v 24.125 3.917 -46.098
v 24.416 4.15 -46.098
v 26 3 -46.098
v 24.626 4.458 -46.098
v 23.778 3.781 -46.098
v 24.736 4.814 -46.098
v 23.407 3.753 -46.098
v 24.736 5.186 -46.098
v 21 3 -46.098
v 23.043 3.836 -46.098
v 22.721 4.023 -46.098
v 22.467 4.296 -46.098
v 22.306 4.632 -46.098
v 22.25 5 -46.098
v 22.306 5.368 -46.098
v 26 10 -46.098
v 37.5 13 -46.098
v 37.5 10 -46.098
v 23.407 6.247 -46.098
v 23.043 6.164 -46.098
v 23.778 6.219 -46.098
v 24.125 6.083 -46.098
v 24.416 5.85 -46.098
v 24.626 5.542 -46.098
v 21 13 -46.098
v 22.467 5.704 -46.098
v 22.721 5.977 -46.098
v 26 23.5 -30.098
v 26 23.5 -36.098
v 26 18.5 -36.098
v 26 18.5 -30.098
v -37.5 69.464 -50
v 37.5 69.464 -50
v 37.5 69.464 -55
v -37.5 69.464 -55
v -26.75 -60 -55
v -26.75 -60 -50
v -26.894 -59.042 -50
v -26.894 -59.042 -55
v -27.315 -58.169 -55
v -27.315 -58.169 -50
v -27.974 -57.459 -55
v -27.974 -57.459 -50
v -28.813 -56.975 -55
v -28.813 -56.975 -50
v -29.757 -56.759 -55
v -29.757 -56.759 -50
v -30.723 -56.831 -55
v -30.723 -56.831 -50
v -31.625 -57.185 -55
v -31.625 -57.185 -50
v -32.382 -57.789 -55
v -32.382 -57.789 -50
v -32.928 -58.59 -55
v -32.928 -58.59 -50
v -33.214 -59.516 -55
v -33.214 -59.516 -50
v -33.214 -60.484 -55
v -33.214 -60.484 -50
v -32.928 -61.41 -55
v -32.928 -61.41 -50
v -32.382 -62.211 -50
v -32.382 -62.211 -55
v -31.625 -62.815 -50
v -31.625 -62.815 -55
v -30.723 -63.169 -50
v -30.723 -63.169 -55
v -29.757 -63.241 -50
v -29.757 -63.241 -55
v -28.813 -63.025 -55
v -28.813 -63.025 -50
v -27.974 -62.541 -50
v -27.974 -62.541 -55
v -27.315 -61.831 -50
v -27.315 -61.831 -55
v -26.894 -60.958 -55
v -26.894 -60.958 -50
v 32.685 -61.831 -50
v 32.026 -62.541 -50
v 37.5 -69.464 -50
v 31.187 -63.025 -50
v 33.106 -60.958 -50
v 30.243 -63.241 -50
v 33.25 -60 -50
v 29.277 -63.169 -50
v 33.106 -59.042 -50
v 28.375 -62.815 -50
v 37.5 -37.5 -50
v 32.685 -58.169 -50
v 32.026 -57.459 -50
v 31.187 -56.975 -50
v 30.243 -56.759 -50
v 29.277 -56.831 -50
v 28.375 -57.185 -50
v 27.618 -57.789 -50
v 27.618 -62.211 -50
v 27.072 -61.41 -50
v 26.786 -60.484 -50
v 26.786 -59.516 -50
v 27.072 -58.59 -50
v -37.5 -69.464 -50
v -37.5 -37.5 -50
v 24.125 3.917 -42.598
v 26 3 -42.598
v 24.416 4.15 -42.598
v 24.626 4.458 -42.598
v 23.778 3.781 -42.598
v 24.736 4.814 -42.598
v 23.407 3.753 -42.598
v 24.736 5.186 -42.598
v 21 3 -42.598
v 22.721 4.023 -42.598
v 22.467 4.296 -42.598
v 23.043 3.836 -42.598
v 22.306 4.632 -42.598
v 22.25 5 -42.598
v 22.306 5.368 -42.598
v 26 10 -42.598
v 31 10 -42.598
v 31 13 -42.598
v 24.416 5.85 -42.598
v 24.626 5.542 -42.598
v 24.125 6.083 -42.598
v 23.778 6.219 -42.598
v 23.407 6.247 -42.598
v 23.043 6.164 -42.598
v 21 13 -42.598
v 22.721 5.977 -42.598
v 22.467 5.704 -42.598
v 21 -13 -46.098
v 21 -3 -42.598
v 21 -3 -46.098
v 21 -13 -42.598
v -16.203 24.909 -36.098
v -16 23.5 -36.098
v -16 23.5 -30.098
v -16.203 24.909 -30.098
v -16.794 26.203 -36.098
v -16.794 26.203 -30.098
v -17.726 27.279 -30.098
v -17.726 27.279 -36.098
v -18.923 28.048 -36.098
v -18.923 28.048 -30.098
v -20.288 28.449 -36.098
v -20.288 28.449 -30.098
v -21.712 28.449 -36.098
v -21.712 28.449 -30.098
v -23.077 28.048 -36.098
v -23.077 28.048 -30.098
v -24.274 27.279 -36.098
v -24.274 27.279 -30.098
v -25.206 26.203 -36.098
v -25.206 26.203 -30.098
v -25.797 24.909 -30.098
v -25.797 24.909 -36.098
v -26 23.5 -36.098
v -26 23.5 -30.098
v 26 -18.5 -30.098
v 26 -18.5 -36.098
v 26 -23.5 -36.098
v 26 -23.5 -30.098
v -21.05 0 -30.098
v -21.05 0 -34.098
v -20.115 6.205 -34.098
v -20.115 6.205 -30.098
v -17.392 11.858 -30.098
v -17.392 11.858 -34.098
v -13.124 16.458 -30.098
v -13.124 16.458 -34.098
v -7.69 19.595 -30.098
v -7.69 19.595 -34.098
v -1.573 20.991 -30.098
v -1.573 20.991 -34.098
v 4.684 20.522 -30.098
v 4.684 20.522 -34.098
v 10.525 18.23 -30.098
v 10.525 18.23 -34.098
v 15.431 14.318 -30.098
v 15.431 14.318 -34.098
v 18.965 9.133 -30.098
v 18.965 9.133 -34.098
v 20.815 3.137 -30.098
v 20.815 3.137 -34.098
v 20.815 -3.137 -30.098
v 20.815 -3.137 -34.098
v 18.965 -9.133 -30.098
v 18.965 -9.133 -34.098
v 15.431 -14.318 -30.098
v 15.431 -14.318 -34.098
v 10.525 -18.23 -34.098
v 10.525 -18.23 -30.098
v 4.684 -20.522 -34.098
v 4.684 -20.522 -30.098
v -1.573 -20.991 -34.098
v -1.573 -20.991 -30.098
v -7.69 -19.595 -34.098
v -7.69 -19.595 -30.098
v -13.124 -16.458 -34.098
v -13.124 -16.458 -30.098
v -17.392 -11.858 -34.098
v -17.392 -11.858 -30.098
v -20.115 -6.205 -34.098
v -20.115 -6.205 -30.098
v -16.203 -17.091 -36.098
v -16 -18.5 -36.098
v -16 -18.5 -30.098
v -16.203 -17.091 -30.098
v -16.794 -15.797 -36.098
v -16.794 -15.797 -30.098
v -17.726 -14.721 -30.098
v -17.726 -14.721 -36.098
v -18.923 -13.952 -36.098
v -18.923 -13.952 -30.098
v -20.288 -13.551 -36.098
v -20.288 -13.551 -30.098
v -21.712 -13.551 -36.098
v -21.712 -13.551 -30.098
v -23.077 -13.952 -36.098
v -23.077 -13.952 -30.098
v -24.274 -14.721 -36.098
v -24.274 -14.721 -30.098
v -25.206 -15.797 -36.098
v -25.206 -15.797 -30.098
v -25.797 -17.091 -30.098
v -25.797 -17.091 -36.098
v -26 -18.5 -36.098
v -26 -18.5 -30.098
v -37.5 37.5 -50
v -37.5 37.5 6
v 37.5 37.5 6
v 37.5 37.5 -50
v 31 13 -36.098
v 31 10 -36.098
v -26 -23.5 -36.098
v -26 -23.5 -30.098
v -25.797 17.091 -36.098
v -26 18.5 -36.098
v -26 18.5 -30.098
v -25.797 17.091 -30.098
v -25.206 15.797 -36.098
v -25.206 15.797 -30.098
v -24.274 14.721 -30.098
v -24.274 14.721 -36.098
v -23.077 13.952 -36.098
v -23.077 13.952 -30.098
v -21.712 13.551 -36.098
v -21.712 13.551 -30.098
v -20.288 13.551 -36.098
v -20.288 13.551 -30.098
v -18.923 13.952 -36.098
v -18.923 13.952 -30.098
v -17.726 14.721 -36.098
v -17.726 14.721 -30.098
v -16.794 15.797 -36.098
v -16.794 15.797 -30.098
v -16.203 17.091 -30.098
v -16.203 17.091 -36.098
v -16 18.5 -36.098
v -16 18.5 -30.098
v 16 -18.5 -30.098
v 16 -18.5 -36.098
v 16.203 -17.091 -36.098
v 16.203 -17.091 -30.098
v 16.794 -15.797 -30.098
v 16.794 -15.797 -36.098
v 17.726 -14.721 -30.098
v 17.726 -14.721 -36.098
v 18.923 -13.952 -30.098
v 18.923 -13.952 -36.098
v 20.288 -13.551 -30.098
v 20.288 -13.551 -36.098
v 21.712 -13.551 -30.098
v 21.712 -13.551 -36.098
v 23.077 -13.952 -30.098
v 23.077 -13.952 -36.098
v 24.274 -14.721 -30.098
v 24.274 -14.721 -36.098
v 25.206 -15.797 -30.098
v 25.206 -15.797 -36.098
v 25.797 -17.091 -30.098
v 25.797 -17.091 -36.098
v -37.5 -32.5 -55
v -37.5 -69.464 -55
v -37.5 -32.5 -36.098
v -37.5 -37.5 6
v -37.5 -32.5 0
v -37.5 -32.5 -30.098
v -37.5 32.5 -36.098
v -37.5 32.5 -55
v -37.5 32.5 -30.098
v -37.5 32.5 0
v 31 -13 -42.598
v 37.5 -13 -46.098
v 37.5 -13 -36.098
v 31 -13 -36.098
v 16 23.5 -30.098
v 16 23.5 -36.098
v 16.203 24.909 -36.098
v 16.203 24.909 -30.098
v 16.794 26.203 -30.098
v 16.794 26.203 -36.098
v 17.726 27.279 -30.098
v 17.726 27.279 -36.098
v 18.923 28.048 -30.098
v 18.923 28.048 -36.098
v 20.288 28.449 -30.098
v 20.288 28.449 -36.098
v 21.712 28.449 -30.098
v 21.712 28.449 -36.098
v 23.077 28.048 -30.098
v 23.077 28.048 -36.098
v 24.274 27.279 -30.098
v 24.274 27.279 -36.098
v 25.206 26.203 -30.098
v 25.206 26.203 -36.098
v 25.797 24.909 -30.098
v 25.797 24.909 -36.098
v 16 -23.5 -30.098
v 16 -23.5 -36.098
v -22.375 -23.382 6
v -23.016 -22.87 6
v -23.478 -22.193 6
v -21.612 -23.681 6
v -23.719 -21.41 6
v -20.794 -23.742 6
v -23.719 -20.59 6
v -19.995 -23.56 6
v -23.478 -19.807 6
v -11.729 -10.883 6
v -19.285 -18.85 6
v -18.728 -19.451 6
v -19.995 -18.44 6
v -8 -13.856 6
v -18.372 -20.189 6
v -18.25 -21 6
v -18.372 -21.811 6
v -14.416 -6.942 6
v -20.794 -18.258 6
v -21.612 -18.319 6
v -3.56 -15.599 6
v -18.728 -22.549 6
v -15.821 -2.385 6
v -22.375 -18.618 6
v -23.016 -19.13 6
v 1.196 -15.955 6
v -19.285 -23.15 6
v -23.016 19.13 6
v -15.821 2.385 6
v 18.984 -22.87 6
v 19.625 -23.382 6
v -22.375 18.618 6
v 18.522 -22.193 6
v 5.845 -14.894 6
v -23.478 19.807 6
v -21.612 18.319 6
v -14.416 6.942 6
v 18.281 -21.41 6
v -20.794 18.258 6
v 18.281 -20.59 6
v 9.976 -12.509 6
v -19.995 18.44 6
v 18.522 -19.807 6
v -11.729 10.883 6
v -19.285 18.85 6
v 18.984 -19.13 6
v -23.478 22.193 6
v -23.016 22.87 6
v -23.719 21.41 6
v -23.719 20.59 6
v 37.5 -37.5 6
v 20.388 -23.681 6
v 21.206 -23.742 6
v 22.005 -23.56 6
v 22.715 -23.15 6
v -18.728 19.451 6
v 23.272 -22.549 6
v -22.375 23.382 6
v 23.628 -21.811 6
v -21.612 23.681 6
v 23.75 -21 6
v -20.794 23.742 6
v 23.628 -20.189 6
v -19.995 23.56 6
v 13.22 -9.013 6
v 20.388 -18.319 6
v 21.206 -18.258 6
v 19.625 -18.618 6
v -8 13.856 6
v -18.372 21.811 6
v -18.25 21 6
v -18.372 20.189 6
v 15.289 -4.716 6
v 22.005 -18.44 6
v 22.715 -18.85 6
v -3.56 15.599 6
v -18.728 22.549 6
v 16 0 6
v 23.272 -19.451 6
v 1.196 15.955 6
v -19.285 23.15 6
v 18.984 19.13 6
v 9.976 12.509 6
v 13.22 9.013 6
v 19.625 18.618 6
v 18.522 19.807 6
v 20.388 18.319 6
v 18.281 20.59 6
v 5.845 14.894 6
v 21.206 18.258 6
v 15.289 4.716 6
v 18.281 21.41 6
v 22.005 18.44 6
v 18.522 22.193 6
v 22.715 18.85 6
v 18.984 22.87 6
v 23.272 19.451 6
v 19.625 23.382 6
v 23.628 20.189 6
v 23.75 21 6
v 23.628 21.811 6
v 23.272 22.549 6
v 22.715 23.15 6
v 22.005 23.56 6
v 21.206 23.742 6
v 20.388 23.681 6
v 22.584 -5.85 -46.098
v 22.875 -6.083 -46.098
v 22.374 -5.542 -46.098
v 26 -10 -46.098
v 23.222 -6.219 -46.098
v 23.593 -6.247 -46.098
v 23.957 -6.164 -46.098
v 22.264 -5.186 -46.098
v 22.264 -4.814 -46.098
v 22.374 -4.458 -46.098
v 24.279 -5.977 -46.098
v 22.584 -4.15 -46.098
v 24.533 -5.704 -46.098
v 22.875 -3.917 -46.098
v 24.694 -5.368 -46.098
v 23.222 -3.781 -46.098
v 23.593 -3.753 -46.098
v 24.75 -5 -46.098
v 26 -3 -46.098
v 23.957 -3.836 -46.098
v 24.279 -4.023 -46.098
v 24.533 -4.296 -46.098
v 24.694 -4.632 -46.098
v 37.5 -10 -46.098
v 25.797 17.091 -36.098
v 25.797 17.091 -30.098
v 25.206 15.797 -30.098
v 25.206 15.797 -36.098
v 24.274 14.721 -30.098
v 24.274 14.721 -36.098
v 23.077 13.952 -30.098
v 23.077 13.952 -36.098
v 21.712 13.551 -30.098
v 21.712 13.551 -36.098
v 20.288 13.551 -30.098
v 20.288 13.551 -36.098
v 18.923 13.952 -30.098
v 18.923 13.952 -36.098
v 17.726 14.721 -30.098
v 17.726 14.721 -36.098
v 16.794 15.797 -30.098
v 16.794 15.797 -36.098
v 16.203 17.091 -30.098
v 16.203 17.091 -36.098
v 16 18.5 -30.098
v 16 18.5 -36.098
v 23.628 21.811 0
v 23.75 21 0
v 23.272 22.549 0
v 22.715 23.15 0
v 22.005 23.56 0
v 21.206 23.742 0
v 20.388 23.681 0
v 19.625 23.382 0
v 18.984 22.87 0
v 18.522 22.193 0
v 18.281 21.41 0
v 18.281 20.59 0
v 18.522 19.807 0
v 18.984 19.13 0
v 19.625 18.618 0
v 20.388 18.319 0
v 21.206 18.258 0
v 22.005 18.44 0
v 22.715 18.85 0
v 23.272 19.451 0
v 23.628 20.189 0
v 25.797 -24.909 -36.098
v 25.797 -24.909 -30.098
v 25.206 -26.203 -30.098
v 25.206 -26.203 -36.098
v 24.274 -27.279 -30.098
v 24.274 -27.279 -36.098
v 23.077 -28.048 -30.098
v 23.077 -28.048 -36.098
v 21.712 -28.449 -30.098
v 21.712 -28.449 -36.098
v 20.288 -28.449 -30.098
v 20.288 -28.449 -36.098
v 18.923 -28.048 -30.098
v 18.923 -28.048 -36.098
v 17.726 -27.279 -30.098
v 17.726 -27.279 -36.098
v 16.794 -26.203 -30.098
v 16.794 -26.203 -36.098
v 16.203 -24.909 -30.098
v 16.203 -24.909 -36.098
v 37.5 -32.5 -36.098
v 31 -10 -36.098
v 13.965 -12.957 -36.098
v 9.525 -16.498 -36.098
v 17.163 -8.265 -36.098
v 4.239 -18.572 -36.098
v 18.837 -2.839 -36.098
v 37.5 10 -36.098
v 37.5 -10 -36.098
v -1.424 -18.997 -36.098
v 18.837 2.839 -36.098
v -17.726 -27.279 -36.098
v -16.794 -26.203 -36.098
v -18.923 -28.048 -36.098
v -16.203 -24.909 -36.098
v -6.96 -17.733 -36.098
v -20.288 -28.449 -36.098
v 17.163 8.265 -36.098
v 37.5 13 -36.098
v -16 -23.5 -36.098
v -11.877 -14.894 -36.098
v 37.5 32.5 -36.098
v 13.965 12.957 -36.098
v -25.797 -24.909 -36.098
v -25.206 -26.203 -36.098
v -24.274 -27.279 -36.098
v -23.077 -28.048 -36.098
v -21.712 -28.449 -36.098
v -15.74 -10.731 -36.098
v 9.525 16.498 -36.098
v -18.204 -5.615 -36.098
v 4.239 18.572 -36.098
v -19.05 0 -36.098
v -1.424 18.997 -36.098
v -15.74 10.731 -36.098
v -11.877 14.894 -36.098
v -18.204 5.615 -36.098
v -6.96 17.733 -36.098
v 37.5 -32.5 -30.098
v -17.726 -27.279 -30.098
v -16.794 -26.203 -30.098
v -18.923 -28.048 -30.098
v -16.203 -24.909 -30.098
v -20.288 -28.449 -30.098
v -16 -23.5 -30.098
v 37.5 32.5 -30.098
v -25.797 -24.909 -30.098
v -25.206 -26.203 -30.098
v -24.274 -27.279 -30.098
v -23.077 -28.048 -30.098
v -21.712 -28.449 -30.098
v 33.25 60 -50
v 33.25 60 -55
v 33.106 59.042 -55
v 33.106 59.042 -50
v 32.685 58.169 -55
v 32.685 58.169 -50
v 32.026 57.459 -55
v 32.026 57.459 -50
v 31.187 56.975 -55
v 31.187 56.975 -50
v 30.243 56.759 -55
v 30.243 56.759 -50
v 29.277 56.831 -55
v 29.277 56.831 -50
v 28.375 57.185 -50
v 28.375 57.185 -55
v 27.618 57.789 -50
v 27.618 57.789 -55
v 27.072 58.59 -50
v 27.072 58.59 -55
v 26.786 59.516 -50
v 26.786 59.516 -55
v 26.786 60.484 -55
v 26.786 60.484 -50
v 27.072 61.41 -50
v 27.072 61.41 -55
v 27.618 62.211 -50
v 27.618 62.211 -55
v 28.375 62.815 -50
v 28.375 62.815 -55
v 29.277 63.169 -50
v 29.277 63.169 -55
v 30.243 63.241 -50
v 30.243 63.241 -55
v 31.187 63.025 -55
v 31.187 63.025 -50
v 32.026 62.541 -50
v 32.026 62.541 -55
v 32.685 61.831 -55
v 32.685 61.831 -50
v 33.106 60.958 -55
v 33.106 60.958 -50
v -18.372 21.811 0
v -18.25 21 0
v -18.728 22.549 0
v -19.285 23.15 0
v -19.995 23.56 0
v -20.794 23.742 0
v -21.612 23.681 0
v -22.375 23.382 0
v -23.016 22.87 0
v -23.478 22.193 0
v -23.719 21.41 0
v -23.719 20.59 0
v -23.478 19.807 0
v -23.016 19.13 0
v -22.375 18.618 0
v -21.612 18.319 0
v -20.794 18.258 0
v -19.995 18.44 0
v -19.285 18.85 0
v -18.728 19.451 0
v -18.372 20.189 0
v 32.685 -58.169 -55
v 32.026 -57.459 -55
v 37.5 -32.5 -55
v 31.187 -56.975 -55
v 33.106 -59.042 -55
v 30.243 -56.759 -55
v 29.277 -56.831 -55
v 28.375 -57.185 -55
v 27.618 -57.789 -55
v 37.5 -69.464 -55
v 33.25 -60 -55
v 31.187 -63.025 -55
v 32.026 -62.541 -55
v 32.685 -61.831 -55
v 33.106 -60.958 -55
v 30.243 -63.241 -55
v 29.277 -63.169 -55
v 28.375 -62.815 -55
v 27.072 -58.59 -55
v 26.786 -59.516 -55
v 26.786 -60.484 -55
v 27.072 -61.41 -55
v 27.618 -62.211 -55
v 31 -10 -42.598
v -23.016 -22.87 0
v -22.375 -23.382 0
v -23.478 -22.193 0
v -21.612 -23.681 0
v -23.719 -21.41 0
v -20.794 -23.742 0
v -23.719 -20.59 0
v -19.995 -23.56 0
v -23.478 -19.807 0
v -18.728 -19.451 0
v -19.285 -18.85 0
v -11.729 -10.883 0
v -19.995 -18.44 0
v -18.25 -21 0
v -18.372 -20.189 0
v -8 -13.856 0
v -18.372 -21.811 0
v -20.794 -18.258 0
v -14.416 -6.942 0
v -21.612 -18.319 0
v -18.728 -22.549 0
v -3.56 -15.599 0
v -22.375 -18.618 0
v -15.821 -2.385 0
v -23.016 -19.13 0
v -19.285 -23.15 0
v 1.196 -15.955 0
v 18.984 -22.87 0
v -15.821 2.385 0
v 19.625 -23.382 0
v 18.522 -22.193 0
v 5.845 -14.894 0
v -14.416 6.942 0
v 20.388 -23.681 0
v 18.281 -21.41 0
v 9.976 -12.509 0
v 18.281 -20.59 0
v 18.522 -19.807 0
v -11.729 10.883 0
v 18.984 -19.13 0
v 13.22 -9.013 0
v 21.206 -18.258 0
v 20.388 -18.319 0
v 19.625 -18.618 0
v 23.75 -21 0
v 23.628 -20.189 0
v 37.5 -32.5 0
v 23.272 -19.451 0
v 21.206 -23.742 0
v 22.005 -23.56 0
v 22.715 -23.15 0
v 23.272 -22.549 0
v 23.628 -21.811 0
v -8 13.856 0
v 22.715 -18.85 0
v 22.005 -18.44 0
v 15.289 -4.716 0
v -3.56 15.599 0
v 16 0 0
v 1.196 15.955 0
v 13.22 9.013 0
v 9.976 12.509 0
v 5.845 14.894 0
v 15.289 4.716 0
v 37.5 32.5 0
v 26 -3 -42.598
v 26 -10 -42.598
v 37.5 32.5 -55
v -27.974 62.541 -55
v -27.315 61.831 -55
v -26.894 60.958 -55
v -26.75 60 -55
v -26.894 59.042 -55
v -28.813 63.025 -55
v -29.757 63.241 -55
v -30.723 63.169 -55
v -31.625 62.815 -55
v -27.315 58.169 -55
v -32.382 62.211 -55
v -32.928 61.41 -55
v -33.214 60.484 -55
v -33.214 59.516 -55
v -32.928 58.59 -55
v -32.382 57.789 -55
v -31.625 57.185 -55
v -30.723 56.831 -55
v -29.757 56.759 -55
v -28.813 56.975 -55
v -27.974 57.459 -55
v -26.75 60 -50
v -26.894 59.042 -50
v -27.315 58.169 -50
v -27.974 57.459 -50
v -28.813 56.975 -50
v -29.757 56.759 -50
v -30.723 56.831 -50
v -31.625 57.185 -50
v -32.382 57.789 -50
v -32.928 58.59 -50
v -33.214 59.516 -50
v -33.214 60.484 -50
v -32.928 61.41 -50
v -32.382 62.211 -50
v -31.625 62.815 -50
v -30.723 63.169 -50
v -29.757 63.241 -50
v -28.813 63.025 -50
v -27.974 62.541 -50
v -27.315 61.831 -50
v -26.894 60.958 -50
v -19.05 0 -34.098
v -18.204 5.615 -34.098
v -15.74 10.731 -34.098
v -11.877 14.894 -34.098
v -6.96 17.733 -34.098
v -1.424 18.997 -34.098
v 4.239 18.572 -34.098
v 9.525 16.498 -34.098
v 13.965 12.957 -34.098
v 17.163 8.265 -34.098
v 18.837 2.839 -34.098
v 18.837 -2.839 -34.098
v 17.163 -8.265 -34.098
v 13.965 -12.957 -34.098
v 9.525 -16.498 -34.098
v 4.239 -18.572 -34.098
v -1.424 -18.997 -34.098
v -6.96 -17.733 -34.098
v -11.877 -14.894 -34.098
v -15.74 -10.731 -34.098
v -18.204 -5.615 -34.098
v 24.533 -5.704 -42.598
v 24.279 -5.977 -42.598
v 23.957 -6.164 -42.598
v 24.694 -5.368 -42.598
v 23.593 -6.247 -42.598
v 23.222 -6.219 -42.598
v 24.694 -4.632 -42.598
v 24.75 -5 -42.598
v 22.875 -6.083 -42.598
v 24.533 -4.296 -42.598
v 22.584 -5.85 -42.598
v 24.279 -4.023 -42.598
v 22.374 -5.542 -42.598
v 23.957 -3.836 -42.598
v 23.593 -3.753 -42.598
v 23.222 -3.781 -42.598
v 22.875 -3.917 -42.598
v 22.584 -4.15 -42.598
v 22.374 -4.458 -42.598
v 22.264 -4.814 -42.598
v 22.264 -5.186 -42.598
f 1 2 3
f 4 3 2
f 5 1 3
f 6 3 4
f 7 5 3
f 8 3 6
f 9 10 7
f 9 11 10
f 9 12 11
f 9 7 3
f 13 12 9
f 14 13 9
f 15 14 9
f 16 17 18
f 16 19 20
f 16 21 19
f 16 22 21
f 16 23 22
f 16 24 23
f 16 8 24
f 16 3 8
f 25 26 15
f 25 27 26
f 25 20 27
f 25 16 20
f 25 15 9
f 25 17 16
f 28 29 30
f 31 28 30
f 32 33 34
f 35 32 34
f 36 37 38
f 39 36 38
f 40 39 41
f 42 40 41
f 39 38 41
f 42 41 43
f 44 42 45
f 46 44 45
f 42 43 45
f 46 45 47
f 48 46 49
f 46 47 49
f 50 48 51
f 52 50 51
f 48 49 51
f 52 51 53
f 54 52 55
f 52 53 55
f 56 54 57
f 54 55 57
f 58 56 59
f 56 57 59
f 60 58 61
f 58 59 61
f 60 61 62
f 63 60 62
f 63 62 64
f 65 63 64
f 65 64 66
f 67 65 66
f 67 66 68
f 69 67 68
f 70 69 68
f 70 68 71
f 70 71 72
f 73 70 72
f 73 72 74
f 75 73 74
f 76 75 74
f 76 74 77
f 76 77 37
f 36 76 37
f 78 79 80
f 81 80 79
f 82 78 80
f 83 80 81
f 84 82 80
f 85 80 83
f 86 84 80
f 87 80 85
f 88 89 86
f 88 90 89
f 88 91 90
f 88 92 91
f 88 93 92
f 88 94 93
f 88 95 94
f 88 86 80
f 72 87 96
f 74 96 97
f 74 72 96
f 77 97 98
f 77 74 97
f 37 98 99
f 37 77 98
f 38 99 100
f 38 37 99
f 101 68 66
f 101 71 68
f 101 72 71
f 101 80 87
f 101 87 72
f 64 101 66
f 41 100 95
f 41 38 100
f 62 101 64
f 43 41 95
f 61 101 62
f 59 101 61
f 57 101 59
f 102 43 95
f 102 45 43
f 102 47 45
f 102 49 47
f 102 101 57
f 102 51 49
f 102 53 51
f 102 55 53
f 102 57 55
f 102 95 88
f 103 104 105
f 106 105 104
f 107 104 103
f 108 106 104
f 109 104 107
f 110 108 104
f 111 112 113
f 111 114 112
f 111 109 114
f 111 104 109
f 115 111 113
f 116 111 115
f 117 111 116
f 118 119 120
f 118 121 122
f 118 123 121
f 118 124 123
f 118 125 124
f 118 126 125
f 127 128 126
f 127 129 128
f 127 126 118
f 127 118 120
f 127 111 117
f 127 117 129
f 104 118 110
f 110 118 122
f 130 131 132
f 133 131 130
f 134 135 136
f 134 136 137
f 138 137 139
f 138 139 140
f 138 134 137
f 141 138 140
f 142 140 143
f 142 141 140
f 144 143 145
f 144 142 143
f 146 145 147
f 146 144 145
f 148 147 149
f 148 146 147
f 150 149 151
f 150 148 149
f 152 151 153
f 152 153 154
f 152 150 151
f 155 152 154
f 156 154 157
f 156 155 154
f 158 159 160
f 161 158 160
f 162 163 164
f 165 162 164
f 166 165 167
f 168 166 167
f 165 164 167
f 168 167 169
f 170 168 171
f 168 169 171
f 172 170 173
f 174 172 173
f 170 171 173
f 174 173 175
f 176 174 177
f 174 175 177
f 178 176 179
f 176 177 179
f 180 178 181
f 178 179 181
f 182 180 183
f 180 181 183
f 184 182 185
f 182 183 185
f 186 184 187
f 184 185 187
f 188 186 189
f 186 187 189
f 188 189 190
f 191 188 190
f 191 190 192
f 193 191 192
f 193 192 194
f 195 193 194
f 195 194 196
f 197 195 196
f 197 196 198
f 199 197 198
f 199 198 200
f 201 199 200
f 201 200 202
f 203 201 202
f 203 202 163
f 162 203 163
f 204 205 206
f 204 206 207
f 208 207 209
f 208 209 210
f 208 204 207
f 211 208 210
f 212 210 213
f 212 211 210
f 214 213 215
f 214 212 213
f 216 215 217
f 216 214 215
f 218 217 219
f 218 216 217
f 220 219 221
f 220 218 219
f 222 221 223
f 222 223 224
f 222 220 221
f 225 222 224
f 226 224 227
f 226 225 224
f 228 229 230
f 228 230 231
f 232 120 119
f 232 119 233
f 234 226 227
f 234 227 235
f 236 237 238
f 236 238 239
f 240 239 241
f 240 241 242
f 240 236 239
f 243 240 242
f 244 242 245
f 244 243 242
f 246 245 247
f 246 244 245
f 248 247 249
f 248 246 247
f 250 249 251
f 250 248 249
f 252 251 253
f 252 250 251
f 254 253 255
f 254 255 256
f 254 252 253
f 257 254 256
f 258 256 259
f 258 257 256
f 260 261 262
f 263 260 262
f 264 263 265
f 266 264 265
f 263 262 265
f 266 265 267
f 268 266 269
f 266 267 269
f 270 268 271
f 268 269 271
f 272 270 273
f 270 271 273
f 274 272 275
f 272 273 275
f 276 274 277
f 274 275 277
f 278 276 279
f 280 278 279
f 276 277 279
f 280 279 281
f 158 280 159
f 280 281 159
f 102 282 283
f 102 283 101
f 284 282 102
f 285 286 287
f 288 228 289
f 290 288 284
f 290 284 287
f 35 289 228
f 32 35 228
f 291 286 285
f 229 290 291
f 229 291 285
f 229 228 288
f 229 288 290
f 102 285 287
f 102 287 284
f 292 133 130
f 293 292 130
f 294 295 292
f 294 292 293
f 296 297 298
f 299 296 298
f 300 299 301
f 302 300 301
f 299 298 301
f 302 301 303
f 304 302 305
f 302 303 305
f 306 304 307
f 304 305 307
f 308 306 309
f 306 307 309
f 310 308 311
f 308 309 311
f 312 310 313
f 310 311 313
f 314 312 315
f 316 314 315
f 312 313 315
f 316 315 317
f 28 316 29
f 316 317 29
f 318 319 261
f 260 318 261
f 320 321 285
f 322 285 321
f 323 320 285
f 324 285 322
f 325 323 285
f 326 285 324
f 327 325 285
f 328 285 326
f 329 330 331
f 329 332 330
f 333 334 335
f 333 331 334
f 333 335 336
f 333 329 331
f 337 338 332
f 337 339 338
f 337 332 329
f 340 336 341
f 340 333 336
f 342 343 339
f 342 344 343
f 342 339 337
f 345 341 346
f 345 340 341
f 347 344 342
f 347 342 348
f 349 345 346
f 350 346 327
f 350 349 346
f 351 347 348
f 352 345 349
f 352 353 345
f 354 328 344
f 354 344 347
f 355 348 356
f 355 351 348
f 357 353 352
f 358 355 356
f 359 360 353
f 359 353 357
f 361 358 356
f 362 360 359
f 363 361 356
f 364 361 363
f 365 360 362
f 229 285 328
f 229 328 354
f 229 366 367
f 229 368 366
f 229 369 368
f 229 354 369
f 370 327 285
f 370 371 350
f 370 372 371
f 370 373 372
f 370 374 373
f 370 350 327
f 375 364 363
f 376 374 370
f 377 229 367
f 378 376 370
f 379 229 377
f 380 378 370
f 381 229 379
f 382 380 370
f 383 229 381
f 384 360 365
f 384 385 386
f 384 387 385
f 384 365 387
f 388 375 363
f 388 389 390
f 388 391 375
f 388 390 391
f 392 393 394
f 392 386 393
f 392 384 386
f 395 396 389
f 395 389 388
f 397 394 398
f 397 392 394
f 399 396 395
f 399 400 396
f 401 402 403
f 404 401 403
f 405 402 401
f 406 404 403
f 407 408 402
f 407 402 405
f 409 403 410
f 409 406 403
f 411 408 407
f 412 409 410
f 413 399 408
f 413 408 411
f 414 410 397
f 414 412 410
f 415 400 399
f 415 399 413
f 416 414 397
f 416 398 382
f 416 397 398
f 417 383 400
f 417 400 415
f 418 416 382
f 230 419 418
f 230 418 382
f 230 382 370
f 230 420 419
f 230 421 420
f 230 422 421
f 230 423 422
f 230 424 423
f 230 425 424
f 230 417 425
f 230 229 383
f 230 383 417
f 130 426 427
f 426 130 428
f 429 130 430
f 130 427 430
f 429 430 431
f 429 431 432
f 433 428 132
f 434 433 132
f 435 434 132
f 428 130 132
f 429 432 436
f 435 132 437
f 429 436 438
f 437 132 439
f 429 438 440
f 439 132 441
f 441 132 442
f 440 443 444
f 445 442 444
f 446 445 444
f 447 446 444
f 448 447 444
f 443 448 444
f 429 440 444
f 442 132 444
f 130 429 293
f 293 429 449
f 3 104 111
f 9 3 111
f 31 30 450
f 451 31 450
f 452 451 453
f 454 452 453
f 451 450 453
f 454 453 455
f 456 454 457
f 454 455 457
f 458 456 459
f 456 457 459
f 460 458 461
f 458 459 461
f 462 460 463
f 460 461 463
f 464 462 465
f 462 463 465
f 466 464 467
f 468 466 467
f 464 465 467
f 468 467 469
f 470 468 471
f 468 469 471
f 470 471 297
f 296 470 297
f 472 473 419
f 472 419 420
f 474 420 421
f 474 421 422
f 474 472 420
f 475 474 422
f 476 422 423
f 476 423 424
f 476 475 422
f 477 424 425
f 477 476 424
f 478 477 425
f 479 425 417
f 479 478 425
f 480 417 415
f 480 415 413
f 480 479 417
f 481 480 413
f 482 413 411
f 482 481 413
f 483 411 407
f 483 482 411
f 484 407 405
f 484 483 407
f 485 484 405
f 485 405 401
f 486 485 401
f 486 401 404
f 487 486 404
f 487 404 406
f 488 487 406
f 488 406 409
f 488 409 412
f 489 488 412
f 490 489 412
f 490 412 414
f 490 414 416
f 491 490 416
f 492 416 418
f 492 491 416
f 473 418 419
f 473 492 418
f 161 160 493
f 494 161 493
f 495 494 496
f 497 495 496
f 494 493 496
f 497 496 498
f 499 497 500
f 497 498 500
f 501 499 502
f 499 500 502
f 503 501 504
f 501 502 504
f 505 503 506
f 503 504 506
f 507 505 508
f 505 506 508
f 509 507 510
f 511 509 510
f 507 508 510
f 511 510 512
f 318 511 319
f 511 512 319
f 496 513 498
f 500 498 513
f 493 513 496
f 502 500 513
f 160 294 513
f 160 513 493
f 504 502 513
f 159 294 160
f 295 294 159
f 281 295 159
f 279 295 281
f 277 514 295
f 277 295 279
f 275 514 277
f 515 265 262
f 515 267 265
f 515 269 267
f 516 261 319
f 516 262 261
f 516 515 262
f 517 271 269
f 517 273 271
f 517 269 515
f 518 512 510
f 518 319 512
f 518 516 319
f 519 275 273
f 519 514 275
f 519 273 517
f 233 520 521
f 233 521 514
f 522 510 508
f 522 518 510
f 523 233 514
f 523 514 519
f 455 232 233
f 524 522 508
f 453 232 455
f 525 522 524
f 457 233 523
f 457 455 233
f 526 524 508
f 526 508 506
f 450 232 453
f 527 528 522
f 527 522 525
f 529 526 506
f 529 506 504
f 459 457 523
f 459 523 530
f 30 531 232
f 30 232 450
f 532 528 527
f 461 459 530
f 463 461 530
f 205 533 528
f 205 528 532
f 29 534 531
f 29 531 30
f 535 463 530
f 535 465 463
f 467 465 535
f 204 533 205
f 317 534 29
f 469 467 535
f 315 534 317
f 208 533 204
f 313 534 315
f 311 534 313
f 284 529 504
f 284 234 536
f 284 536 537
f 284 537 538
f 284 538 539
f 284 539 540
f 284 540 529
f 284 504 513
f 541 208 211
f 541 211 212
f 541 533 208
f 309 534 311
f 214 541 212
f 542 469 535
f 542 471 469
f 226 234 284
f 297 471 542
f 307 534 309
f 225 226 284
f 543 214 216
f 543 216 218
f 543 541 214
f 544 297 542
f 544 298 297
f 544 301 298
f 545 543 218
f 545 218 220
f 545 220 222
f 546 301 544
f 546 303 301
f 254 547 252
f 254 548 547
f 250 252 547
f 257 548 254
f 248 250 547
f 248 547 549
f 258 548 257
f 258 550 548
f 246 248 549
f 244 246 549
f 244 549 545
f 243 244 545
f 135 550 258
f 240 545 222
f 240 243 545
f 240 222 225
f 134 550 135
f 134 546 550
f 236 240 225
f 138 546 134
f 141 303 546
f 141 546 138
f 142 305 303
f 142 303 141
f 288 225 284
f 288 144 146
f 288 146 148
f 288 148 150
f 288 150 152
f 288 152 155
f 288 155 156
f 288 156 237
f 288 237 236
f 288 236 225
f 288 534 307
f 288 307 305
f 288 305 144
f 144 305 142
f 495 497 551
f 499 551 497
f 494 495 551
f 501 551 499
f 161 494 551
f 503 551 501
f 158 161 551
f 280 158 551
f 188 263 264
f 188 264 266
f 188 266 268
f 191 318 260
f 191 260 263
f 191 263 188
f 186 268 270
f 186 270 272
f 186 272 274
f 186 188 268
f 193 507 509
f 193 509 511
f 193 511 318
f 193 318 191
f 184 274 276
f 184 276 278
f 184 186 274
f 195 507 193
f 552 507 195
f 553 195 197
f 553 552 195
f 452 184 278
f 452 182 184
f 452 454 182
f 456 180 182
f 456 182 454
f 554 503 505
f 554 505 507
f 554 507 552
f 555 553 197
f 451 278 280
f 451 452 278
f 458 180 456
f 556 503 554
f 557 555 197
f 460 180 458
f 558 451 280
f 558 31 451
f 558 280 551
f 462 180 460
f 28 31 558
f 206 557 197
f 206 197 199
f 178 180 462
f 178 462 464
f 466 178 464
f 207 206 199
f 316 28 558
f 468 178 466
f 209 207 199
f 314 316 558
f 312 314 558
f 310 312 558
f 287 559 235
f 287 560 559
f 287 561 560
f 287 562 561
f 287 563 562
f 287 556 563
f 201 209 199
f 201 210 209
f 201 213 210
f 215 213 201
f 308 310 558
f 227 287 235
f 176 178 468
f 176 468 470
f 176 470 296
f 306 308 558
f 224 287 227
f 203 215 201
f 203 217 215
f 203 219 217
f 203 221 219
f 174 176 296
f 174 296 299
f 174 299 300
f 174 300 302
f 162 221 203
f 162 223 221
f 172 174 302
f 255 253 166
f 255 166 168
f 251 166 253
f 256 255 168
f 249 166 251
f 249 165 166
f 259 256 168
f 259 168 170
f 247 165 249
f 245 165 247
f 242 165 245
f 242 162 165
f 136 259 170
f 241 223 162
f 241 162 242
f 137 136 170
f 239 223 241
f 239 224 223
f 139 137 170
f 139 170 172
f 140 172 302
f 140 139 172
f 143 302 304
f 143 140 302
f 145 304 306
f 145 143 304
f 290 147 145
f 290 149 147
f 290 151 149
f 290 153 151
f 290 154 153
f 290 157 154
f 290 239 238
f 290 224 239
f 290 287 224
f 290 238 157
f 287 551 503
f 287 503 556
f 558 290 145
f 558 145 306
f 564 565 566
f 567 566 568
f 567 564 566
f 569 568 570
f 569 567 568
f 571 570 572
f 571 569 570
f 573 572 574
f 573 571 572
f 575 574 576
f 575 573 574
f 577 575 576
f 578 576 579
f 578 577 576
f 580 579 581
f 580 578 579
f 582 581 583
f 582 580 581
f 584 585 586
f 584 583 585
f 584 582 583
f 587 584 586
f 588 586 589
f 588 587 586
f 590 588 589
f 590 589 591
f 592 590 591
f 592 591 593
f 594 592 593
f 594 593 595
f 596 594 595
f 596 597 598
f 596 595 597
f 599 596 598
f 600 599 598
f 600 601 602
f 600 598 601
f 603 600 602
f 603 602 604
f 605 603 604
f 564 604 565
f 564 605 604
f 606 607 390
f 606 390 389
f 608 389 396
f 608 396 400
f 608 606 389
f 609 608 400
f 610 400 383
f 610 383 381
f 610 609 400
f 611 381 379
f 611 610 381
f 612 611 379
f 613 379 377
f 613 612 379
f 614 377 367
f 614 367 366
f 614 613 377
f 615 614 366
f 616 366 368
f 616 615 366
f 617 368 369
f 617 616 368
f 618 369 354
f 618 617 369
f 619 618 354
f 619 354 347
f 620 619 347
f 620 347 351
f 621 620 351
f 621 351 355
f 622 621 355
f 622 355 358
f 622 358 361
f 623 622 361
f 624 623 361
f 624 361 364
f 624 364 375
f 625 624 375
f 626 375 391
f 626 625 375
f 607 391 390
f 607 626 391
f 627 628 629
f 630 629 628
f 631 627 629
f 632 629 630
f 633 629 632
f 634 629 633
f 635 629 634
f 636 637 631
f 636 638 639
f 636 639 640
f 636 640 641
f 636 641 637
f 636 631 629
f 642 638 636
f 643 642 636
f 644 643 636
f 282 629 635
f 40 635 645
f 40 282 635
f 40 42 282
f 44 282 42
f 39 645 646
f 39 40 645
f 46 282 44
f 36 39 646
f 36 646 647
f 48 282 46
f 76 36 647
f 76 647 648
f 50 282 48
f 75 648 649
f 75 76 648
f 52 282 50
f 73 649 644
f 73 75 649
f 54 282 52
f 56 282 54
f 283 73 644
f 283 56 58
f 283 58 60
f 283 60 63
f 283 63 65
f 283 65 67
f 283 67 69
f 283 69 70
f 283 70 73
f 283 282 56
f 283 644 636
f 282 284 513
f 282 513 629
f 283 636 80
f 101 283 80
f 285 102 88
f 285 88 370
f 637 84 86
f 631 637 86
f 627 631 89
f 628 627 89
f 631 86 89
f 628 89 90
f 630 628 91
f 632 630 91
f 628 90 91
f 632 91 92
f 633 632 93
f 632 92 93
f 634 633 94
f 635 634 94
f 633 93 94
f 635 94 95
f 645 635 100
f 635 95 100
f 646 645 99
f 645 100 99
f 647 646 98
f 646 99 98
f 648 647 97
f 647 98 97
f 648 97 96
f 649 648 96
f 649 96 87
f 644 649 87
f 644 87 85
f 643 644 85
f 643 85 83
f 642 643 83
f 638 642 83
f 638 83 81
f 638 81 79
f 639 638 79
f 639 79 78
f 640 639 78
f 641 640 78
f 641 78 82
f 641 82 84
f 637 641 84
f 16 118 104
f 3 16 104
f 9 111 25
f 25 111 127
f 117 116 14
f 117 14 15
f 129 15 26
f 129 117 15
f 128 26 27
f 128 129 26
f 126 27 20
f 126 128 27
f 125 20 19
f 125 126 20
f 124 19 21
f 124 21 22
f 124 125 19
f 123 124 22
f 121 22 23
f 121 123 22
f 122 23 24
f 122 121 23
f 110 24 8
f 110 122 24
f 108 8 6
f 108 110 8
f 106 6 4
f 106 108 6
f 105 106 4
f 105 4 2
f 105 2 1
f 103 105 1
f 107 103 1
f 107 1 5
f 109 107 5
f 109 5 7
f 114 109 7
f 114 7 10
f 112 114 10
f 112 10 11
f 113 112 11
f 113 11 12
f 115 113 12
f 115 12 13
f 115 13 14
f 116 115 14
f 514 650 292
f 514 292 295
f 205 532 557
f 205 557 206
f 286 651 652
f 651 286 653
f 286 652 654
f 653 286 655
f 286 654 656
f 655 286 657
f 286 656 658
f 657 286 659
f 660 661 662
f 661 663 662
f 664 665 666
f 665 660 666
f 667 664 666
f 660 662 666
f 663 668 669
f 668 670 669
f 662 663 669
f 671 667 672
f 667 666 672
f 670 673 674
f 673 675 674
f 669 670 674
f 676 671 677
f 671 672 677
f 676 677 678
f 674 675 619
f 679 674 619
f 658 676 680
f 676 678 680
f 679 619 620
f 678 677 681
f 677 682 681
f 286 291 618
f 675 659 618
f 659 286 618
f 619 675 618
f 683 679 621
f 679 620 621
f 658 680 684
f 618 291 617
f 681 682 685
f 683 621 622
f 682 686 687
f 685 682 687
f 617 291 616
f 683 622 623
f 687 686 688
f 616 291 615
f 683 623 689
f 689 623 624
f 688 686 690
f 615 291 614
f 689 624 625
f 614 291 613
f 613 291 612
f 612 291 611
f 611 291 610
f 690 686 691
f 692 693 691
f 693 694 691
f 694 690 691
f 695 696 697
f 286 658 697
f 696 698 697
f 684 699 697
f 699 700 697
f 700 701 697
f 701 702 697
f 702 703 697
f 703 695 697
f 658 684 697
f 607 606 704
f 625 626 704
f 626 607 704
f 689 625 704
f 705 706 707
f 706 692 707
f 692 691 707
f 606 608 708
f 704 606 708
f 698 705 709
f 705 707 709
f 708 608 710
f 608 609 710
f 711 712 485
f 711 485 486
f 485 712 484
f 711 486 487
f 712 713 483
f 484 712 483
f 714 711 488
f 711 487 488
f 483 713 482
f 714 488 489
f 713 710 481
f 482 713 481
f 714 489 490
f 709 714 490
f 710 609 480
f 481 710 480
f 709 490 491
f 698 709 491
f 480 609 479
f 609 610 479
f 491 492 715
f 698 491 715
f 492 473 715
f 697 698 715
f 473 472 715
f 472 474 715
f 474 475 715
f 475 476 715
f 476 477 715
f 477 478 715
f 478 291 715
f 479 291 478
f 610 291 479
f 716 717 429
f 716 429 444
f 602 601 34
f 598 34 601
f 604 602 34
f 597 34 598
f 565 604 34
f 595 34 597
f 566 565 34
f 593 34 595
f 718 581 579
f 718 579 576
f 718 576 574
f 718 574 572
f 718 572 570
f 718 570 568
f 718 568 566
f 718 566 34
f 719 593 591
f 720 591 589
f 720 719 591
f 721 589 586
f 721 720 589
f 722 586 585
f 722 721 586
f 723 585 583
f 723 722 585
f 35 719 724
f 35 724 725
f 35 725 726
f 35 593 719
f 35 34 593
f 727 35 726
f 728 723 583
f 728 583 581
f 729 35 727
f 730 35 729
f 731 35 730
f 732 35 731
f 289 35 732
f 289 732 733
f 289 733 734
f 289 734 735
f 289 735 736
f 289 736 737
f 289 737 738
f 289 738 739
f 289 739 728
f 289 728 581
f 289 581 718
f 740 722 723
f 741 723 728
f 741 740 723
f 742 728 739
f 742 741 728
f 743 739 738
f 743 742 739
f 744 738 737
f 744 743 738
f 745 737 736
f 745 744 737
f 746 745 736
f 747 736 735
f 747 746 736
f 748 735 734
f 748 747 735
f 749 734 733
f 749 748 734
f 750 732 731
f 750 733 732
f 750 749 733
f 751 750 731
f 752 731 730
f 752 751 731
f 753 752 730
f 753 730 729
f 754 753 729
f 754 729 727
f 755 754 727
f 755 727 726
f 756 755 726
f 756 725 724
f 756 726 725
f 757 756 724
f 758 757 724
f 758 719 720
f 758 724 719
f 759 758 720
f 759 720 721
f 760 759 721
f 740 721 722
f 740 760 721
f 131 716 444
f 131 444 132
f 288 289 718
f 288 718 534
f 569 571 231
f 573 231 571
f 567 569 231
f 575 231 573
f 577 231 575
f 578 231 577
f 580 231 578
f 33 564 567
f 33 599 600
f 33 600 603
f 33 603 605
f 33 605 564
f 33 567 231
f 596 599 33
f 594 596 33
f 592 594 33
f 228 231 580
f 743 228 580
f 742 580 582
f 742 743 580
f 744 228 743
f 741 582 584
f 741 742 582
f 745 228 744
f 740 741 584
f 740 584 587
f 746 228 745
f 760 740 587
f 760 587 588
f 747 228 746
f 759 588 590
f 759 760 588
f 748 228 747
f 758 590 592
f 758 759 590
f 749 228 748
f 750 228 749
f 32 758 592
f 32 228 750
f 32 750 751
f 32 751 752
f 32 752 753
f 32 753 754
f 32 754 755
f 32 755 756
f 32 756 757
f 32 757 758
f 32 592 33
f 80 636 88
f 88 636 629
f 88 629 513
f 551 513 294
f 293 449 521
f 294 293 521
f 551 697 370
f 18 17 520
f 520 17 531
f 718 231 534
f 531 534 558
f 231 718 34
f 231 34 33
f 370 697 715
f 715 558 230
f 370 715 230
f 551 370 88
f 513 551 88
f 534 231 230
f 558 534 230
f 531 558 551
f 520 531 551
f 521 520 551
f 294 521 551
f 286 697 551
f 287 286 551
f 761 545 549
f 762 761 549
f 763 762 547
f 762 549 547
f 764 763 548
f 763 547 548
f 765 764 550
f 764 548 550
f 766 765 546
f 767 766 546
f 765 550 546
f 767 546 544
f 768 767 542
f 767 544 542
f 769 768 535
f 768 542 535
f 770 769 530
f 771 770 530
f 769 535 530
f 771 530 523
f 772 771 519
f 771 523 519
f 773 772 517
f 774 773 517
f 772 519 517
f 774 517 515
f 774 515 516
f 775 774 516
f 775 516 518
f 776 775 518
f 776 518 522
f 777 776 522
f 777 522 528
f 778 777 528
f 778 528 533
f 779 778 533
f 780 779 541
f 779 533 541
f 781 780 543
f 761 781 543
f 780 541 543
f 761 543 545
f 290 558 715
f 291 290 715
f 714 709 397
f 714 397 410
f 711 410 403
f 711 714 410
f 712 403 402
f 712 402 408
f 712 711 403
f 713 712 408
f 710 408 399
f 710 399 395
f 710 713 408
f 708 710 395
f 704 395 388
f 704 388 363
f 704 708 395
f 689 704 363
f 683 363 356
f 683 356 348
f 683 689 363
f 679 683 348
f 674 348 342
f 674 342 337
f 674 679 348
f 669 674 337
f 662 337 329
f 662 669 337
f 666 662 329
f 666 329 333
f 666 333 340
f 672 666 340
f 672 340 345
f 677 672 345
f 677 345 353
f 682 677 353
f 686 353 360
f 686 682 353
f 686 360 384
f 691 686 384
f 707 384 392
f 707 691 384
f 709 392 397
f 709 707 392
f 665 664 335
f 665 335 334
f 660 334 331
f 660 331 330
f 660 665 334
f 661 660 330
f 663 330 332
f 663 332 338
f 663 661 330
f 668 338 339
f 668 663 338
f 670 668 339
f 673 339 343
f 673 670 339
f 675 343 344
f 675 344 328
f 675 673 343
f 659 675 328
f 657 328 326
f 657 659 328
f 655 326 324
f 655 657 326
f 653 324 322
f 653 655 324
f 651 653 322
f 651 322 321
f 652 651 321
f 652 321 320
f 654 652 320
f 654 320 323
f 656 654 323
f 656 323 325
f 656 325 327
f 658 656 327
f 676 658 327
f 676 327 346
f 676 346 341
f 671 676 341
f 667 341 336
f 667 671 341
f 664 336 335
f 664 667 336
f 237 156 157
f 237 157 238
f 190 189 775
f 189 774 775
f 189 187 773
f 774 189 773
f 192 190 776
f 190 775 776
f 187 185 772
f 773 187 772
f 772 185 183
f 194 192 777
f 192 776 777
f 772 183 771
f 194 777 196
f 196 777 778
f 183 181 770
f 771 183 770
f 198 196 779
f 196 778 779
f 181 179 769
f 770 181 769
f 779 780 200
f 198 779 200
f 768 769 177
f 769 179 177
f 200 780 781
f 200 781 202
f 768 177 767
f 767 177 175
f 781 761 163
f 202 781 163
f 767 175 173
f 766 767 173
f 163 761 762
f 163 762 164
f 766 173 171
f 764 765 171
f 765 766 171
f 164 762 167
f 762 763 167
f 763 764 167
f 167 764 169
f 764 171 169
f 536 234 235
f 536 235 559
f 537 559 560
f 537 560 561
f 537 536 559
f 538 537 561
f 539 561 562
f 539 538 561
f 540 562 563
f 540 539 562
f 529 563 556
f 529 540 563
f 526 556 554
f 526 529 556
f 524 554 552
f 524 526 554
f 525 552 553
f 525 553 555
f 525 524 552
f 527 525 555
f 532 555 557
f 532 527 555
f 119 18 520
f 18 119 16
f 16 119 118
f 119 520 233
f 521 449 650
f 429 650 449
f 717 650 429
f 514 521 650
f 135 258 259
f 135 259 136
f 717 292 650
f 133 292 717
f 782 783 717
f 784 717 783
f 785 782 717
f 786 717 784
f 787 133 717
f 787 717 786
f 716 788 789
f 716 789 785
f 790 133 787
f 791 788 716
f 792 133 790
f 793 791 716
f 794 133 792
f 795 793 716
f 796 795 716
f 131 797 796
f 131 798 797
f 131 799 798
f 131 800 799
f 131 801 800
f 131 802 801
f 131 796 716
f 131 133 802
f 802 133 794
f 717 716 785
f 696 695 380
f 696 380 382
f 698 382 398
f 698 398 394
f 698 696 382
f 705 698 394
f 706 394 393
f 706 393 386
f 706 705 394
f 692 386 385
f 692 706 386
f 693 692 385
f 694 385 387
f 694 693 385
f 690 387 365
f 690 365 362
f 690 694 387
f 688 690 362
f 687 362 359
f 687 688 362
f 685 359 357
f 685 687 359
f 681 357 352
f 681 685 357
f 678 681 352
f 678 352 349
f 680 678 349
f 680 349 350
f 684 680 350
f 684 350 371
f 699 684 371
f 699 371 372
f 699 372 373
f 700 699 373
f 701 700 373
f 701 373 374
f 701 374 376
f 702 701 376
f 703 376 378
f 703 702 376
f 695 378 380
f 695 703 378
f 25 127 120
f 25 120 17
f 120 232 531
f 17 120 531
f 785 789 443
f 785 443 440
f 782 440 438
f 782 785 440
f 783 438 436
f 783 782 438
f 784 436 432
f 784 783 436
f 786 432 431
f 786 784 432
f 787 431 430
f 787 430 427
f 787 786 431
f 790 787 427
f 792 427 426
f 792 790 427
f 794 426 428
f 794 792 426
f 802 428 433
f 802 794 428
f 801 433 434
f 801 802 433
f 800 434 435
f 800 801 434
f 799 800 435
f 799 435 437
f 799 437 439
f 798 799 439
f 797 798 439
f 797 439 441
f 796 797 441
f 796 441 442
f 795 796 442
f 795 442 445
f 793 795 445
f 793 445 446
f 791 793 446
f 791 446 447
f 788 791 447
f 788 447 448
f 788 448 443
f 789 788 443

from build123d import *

# Parameters (mm, degrees)
SKETCH1_W           = 75
SKETCH1_H           = 75
SKETCH1_R           = 2.75
SKETCH1_R_2         = 16
BOSS_EXTRUDE1_DEPTH = 6
BOSS_EXTRUDE2_DEPTH = 75
SKETCH3_R           = 21.05
CUT_EXTRUDE1_DEPTH  = 6
SKETCH4_R           = 21.05
SKETCH4_R_2         = 19.05
BOSS_EXTRUDE3_DEPTH = 2
SKETCH5_R           = 3.25
CUT_EXTRUDE2_DEPTH  = 97.785892457
CUT_EXTRUDE3_DEPTH  = 6
SKETCH7_R           = 1.25
BOSS_EXTRUDE4_DEPTH = 10
SKETCH11_W          = 6.5
SKETCH11_H          = 26
CUT_EXTRUDE7_DEPTH  = 10


with BuildPart() as part:
    # Sketch1 → Boss-Extrude1 (new body)
    with BuildSketch(Plane.XY):
        Rectangle(SKETCH1_W, SKETCH1_H)
        with Locations((21, 21)):
            Circle(SKETCH1_R, mode=Mode.SUBTRACT)
        with Locations((21, -21)):
            Circle(SKETCH1_R, mode=Mode.SUBTRACT)
        with Locations((-21, -21)):
            Circle(SKETCH1_R, mode=Mode.SUBTRACT)
        with Locations((-21, 21)):
            Circle(SKETCH1_R, mode=Mode.SUBTRACT)
        Circle(SKETCH1_R_2, mode=Mode.SUBTRACT)
    extrude(amount=BOSS_EXTRUDE1_DEPTH)

    # Sketch2 → Boss-Extrude2 (add)
    with BuildSketch(Plane.ZY.offset(37.5)):
        Polygon((0, 37.5), (-50, 37.5), (-50, 69.464084092), (-55, 69.464084092), (-55, 32.5), (-36.09839393, 32.5), (-36.09839393, -32.5), (-55, -32.5), (-55, -69.464084092), (-50, -69.464084092), (-50, -37.5), (0, -37.5), (0, -32.5), (-30.09839393, -32.5), (-30.09839393, 32.5), (0, 32.5), align=None)
    extrude(amount=-BOSS_EXTRUDE2_DEPTH)

    # Sketch3 → Cut-Extrude1 (cut)
    with BuildSketch(Plane(origin=(0, 0, -36.09839393), x_dir=(-1, 0, 0), z_dir=(0, 0, -1))):
        Circle(SKETCH3_R)
    extrude(amount=-CUT_EXTRUDE1_DEPTH, mode=Mode.SUBTRACT)

    # Sketch4 → Boss-Extrude3 (add)
    with BuildSketch(Plane(origin=(0, 0, -36.09839393), x_dir=(-1, 0, 0), z_dir=(0, 0, -1))):
        Circle(SKETCH4_R)
        Circle(SKETCH4_R_2, mode=Mode.SUBTRACT)
    extrude(amount=-BOSS_EXTRUDE3_DEPTH)

    # Sketch5 → Cut-Extrude2 (cut, through all)
    with BuildSketch(Plane.XY.offset(-50)):
        with Locations((30, -60)):
            Circle(SKETCH5_R)
        with Locations((-30, -60)):
            Circle(SKETCH5_R)
    cut_extrude2 = extrude(amount=-CUT_EXTRUDE2_DEPTH, mode=Mode.SUBTRACT)

    # Mirror1: Cut-Extrude2 across plane
    add(cut_extrude2.mirror(Plane.ZX), mode=Mode.SUBTRACT)

    # Sketch6 → Cut-Extrude3 (cut)
    with BuildSketch(Plane(origin=(0, 0, -36.09839393), x_dir=(-1, 0, 0), z_dir=(0, 0, -1))):
        with BuildLine():
            Line((26, 23.5), (26, 18.5))
            ThreePointArc((26, 18.5), (21, 13.5), (16, 18.5))
            Line((16, 18.5), (16, 23.5))
            ThreePointArc((16, 23.5), (21, 28.5), (26, 23.5))
        make_face()
        with BuildLine():
            Line((16, -23.5), (16, -18.5))
            ThreePointArc((16, -18.5), (21, -13.5), (26, -18.5))
            Line((26, -18.5), (26, -23.5))
            ThreePointArc((26, -23.5), (21, -28.5), (16, -23.5))
        make_face()
        with BuildLine():
            Line((-16, -23.5), (-16, -18.5))
            ThreePointArc((-16, -18.5), (-21, -13.5), (-26, -18.5))
            Line((-26, -18.5), (-26, -23.5))
            ThreePointArc((-26, -23.5), (-21, -28.5), (-16, -23.5))
        make_face()
        with BuildLine():
            Line((-26, 23.5), (-26, 18.5))
            ThreePointArc((-26, 18.5), (-21, 13.5), (-16, 18.5))
            Line((-16, 18.5), (-16, 23.5))
            ThreePointArc((-16, 23.5), (-21, 28.5), (-26, 23.5))
        make_face()
    extrude(amount=-CUT_EXTRUDE3_DEPTH, mode=Mode.SUBTRACT)

    # Sketch7 → Boss-Extrude4 (add)
    # profile 1 of 2: a face of its own
    with BuildSketch(Plane(origin=(0, 0, -36.09839393), x_dir=(-1, 0, 0), z_dir=(0, 0, -1))):
        Polygon((-26, -3), (-21, -3), (-21, -13), (-37.5, -13), (-37.5, -10), (-26, -10), align=None)
        with Locations(Location((-23.5, -5, 0), (0, 0, 180))):
            Circle(SKETCH7_R, mode=Mode.SUBTRACT)
    # profile 2 of 2: a face of its own
    with BuildSketch(Plane(origin=(0, 0, -36.09839393), x_dir=(-1, 0, 0), z_dir=(0, 0, -1))):
        Polygon((-21, 13), (-37.5, 13), (-37.5, 10), (-26, 10), (-26, 3), (-21, 3), align=None)
        with Locations((-23.5, 5)):
            Circle(SKETCH7_R, mode=Mode.SUBTRACT)
    extrude(amount=BOSS_EXTRUDE4_DEPTH)

    # Sketch11 → Cut-Extrude7 (cut)
    with BuildSketch(Plane.ZY.offset(-21)):
        with Locations((-39.34839393, 0)):
            Rectangle(SKETCH11_W, SKETCH11_H)
    extrude(amount=-CUT_EXTRUDE7_DEPTH, mode=Mode.SUBTRACT)


solid = part.part
